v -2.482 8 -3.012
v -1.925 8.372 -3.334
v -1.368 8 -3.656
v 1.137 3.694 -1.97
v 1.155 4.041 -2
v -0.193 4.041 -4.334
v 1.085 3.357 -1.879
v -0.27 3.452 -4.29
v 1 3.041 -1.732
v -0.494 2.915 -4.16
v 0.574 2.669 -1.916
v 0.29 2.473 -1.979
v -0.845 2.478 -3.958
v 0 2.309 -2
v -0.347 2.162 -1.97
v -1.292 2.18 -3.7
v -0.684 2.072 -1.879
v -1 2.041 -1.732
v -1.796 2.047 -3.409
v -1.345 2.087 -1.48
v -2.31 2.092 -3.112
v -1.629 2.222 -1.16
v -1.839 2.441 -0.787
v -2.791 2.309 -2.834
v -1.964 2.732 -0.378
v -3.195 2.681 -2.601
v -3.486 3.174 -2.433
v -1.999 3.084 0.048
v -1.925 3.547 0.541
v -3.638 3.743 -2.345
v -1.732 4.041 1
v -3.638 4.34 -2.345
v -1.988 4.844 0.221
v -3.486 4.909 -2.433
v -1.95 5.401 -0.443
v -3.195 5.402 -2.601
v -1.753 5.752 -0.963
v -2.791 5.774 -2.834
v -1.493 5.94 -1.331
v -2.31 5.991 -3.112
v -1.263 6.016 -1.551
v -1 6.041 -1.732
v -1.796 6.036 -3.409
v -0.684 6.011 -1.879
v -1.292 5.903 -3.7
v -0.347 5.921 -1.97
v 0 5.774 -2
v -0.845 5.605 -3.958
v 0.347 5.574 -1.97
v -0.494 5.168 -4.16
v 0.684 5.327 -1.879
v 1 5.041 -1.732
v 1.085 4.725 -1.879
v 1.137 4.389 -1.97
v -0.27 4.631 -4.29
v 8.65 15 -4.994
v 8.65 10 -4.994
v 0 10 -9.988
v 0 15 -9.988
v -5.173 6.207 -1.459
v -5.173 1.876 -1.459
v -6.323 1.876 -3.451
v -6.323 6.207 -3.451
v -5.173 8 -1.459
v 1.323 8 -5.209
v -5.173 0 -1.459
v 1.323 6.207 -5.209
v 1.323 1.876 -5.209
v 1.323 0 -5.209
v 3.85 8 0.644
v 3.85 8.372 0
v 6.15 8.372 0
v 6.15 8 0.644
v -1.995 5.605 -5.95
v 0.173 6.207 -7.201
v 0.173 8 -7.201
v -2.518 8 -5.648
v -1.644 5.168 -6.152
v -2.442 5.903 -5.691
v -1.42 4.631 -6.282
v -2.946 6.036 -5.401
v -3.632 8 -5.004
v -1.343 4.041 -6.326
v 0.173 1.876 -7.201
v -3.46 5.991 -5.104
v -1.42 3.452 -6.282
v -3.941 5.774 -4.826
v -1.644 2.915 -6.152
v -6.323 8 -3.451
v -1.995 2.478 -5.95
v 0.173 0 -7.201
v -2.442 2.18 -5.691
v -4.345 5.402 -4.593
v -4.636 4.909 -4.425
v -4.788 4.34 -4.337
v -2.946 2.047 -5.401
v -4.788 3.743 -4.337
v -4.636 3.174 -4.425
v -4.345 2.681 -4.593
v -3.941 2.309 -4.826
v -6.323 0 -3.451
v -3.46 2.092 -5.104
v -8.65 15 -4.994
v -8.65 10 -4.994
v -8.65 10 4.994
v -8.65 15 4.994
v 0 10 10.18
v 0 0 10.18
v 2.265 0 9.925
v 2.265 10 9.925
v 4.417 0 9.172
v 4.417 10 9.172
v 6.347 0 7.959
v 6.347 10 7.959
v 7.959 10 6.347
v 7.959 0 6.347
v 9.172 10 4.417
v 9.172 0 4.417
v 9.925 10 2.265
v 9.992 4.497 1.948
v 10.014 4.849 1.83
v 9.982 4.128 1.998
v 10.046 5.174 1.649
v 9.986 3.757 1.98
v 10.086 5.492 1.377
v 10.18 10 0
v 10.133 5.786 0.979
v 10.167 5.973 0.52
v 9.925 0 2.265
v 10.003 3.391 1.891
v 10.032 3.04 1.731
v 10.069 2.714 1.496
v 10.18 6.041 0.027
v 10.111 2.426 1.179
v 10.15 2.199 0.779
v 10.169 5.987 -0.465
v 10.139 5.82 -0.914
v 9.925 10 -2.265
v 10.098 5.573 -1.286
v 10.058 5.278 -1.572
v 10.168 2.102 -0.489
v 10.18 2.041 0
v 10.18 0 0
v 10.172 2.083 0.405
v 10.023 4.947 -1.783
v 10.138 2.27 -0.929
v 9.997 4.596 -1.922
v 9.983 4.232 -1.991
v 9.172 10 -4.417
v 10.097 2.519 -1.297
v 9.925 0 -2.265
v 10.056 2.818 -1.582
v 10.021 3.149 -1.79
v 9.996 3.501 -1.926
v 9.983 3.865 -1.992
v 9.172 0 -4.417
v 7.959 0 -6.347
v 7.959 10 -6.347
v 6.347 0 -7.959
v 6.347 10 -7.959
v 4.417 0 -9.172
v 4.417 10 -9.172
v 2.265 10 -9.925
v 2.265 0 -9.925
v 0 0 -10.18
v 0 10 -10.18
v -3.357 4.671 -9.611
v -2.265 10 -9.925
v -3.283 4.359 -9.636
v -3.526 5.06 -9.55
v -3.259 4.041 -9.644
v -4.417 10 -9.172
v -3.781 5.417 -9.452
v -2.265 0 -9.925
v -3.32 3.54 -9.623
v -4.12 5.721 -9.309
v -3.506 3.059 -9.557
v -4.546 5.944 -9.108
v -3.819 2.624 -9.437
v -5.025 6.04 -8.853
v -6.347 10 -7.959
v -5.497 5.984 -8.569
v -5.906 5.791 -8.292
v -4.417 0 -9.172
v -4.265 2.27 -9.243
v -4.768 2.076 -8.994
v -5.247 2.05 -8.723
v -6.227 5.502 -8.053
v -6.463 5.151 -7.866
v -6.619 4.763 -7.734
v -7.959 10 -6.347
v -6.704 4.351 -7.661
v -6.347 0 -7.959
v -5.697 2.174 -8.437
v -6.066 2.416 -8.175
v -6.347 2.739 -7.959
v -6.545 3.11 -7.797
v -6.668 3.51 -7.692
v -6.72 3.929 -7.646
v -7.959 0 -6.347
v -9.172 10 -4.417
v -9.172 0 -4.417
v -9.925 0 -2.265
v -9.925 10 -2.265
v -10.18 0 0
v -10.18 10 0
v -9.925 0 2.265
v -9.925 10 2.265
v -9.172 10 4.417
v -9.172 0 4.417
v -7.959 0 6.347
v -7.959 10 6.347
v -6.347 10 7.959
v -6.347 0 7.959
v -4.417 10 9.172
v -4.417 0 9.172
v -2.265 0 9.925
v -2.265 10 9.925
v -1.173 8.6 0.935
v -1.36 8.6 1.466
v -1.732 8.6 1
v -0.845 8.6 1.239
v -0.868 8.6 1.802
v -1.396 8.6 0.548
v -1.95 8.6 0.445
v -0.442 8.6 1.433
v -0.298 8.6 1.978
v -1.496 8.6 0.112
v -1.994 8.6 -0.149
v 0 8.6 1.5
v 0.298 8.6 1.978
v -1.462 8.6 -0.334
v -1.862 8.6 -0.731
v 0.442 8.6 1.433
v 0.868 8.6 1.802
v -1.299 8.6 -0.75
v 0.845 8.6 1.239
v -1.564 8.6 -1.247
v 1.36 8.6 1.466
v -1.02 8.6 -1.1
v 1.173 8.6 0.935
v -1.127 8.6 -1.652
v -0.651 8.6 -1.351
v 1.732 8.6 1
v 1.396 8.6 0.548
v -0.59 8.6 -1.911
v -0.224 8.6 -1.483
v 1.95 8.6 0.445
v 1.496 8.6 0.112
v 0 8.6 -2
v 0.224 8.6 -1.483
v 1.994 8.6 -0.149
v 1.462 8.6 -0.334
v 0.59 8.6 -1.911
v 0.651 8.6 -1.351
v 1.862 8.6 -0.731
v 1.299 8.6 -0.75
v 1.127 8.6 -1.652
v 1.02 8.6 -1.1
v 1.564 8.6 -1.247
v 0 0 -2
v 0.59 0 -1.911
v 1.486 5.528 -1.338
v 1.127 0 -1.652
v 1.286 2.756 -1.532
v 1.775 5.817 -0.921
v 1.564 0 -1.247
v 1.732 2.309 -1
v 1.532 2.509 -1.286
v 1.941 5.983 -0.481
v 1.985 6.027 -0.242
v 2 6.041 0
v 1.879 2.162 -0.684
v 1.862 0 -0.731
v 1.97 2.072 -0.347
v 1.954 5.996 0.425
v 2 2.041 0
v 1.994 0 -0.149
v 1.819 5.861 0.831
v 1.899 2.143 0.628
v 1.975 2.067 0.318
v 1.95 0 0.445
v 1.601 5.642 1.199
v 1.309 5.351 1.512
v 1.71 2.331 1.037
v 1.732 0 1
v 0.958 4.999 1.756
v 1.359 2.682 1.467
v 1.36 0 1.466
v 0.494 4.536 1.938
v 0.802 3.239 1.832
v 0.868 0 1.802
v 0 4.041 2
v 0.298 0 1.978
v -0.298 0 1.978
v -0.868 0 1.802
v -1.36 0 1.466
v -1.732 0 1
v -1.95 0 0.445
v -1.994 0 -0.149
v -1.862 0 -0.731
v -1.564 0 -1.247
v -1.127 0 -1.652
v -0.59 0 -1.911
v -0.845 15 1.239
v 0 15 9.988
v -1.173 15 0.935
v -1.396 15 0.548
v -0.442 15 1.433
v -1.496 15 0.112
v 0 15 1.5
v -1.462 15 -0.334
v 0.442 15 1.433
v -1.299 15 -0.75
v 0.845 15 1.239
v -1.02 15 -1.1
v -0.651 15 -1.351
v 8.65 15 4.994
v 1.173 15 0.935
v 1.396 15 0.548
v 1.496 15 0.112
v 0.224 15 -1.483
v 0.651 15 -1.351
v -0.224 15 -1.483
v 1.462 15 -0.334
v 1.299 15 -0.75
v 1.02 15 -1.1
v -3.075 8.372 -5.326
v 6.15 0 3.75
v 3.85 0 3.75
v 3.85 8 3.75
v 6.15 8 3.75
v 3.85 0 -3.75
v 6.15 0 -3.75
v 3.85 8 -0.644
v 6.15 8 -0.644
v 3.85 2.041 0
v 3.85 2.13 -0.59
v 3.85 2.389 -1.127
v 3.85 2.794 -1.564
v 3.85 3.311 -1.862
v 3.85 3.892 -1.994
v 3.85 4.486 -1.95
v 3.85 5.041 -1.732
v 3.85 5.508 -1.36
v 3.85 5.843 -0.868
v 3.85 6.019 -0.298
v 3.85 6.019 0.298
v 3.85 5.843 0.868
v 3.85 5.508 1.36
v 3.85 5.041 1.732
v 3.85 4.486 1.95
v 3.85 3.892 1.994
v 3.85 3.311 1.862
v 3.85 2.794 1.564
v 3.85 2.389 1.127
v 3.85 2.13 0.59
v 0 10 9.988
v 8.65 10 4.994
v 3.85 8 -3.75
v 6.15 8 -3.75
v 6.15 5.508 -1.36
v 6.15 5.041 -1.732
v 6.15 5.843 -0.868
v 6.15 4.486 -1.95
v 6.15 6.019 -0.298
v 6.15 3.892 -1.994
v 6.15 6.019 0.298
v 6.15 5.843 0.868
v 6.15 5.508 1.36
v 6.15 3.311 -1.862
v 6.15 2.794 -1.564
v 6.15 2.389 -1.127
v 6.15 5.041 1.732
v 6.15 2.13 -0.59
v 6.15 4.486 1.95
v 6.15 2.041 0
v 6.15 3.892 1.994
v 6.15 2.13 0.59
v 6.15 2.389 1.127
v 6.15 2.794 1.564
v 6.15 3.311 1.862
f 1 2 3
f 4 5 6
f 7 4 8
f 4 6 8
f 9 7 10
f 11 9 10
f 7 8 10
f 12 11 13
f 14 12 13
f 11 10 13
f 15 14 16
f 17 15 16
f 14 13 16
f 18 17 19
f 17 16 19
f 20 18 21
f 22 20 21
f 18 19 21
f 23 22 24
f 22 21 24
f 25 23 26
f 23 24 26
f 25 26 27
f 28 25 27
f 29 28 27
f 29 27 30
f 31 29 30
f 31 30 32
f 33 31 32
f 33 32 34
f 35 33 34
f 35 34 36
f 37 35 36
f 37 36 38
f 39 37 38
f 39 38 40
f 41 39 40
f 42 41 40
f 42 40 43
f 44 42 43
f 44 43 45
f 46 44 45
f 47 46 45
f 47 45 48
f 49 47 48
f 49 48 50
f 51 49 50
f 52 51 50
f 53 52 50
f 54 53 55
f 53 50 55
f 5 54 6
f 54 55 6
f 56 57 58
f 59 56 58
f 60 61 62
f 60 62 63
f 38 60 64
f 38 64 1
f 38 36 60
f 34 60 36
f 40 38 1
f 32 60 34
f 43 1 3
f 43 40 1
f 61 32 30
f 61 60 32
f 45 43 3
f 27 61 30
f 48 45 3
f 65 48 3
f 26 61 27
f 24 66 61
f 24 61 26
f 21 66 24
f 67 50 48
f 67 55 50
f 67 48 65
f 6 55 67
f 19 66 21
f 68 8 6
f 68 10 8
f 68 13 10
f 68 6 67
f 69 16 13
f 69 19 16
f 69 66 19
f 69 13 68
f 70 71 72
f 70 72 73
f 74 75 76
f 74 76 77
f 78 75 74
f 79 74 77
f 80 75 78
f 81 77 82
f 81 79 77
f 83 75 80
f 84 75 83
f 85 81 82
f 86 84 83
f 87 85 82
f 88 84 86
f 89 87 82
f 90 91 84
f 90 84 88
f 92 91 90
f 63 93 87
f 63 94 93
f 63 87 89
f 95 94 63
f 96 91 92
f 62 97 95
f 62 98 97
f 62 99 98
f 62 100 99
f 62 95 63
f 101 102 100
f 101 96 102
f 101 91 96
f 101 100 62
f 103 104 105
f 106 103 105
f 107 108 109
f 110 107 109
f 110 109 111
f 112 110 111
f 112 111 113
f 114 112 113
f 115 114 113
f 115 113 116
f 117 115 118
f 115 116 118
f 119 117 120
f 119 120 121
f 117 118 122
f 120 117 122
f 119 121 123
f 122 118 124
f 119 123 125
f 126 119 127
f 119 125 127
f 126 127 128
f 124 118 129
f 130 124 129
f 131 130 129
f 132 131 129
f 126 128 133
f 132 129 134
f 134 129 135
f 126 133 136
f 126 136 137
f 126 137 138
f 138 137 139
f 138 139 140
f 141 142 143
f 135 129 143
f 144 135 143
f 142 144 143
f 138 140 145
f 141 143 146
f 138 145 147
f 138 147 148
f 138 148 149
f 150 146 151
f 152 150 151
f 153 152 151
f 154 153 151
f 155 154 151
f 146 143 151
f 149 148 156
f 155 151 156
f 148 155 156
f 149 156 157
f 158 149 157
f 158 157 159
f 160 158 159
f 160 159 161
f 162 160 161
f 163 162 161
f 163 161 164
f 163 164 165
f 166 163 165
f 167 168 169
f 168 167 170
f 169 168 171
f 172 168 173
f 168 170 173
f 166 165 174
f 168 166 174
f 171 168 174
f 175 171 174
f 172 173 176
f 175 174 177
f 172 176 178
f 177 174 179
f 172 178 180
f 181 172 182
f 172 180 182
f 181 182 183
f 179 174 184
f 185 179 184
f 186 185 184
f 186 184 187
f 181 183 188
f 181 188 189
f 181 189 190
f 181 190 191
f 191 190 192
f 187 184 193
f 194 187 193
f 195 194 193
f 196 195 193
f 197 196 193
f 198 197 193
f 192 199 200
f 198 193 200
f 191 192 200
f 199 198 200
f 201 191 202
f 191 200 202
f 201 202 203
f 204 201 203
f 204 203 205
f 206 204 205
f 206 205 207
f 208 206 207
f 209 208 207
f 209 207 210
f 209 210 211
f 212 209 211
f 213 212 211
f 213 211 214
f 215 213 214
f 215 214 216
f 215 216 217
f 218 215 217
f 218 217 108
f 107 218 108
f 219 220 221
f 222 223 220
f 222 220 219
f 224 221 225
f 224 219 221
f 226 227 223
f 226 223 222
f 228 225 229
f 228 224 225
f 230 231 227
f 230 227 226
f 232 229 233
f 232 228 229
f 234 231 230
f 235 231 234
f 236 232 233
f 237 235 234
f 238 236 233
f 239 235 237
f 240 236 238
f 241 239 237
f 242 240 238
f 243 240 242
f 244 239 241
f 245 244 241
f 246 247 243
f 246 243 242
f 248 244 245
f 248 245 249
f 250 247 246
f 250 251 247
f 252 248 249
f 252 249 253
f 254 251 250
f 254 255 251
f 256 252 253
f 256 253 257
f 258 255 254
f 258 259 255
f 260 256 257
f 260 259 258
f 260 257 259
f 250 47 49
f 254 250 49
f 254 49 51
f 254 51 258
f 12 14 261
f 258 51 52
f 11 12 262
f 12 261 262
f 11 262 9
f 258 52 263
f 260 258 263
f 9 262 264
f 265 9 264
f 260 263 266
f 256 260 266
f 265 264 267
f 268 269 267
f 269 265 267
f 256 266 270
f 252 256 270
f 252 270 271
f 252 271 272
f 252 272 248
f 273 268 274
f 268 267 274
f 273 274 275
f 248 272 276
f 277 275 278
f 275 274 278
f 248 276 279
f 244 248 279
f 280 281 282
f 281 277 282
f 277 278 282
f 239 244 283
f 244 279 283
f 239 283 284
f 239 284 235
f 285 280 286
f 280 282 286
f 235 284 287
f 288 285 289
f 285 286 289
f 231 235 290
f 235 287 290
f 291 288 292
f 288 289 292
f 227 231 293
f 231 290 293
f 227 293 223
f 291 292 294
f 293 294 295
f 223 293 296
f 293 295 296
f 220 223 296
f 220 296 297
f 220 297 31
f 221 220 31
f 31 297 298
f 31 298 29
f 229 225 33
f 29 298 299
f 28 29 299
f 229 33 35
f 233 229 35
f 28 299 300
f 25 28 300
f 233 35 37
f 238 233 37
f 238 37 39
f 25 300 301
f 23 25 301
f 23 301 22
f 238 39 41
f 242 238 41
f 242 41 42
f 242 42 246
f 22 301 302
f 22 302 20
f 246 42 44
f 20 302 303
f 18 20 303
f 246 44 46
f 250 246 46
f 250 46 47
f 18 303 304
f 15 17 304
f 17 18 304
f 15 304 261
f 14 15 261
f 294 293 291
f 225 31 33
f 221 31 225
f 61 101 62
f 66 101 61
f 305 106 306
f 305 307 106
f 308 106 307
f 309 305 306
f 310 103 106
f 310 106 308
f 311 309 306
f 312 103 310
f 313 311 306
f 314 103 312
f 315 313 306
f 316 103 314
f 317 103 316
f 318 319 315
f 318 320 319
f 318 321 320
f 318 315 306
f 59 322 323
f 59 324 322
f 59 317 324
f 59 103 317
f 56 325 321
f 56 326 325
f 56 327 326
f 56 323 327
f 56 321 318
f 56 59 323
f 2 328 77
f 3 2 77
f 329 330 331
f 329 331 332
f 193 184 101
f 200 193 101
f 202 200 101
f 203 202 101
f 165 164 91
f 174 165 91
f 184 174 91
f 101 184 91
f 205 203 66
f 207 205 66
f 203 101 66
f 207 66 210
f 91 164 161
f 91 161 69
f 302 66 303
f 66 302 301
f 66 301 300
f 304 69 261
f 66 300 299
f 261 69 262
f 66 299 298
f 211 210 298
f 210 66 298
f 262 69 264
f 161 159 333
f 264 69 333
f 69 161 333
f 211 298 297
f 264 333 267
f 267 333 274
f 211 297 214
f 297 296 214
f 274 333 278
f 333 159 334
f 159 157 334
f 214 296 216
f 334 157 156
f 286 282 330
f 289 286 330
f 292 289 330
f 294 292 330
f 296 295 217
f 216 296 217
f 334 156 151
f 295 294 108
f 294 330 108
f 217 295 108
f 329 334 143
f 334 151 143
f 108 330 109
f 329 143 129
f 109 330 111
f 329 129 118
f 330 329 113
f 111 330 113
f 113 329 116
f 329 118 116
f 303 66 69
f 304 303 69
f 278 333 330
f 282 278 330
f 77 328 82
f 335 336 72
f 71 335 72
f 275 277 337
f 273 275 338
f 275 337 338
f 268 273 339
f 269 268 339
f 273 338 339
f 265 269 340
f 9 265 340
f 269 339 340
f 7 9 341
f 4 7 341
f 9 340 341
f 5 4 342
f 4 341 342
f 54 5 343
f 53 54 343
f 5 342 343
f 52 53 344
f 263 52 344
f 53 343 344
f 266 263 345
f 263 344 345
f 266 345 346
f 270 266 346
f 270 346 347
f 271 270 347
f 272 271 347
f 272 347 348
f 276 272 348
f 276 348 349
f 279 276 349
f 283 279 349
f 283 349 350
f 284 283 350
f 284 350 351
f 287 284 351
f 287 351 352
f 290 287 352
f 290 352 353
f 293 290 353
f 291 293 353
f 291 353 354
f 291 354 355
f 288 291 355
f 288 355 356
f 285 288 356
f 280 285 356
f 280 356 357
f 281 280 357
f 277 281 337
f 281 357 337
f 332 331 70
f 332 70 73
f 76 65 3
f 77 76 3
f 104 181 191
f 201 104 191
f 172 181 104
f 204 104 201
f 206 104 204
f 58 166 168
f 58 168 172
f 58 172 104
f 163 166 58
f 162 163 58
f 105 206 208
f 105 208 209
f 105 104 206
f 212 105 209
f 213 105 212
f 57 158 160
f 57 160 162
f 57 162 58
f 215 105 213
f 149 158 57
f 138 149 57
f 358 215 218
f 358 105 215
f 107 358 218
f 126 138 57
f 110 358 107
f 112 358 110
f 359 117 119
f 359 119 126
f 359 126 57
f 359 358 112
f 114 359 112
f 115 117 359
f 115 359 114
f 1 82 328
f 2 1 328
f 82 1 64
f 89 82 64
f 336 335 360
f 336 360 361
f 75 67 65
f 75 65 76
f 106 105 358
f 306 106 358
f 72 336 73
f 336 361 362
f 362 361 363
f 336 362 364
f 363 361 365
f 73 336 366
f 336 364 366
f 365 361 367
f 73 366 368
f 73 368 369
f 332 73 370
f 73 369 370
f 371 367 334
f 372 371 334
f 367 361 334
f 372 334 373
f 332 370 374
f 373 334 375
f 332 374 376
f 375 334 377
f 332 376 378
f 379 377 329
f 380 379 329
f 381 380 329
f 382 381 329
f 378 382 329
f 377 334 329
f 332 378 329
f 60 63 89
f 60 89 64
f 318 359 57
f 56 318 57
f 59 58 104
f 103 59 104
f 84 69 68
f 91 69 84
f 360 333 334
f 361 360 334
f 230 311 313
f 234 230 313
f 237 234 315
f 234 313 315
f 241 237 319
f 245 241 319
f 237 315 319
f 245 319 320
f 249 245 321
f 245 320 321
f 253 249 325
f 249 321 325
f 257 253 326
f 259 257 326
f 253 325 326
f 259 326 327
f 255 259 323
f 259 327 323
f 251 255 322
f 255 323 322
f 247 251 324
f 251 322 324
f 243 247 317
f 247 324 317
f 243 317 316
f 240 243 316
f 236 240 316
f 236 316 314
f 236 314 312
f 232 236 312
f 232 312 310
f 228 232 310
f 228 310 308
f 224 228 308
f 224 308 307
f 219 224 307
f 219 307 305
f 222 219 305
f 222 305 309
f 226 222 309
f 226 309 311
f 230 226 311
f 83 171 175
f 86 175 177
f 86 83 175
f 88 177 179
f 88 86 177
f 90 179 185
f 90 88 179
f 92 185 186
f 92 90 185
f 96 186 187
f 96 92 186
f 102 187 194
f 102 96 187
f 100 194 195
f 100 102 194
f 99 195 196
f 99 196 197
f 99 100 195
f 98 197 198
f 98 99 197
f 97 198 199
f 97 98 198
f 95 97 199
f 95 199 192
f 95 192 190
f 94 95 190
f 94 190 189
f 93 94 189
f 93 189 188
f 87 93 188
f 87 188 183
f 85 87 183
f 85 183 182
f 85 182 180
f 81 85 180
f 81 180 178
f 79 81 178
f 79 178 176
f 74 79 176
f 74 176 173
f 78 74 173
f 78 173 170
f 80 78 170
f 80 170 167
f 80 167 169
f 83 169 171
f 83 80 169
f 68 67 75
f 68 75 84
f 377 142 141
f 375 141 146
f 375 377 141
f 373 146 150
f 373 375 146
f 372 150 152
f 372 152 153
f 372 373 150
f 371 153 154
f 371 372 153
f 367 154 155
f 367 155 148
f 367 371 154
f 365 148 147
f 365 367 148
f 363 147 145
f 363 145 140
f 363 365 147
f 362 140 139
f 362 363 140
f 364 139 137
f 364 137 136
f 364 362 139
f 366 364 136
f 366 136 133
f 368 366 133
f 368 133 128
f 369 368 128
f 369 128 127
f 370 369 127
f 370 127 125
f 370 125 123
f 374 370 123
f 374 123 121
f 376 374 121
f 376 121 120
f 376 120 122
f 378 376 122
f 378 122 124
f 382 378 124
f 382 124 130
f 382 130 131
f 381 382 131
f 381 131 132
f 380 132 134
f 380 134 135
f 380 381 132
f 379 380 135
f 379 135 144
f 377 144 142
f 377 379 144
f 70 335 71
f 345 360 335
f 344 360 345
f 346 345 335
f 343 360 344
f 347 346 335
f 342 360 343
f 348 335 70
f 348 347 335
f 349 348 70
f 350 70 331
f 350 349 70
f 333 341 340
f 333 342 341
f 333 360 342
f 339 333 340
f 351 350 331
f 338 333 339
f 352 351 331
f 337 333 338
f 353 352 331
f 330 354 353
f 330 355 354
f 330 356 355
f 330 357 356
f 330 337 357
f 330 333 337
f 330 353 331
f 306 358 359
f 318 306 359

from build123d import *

# Parameters (mm, degrees)
SKETCH_1_R                           = 10.18
EXTRUDE_355_DEPTH                    = 10
EXTRUDE_479_DEPTH                    = 5
SKETCH_3_R                           = 2
CUT_EXTRUDE_578_DEPTH                = 8.6
SKETCH_4_W                           = 2.3
SKETCH_4_H                           = 7.5
CUT_EXTRUDE_807_DEPTH                = 8
SKETCH_5_R                           = 2
CUT_EXTRUDE_1_DEPTH                  = 23.923204401
CUT_EXTRUDE_1_DIRECTION_2_REACH      = 24.923
CUT_EXTRUDE_1_DIRECTION_2_END_RADIUS = 2
SKETCH_6_R                           = 2
CUT_EXTRUDE_2_DEPTH                  = 24.540700338
CUT_EXTRUDE_2_DIRECTION_2_REACH      = 25.541
CUT_EXTRUDE_2_DIRECTION_2_END_RADIUS = 2
CUT_EXTRUDE_1_2_DEPTH                = 2.3
CUT_EXTRUDE_2_2_DEPTH                = 2.3
SKETCH_9_R                           = 1.5
CUT_EXTRUDE_7_DEPTH                  = 21.790978983


with BuildPart() as part:
    # Эскиз1 → Extrude 355 (new body)
    with BuildSketch(Plane(origin=(0, 0, 0), x_dir=(1, 0, 0), z_dir=(0, 1, 0))):
        with Locations(Location((0, 0, 0), (0, 0, 270))):
            Circle(SKETCH_1_R)
    extrude(amount=EXTRUDE_355_DEPTH)

    # Эскиз2 → Extrude 479 (add)
    with BuildSketch(Plane(origin=(0, 10, 0), x_dir=(1, 0, 0), z_dir=(0, 1, 0))):
        Polygon((0, 9.988159657), (-8.65, 4.994079828), (-8.65, -4.994079828), (0, -9.988159657), (8.65, -4.994079828), (8.65, 4.994079828), align=None)
    extrude(amount=EXTRUDE_479_DEPTH)

    # Эскиз3 → Cut-Extrude 578 (cut)
    with BuildSketch(Plane.XZ):
        with Locations(Location((0, 0, 0), (0, 0, 270))):
            Circle(SKETCH_3_R)
    extrude(amount=-CUT_EXTRUDE_578_DEPTH, mode=Mode.SUBTRACT)

    # Эскиз4 → Cut-Extrude 807 (cut)
    with BuildSketch(Plane.XZ):
        Polygon((-5.172595264, -1.459197805), (1.322595264, -5.209197805), (0.172595264, -7.201056233), (-6.322595264, -3.451056233), align=None)
        with Locations((5, 0)):
            Rectangle(SKETCH_4_W, SKETCH_4_H)
    extrude(amount=-CUT_EXTRUDE_807_DEPTH, mode=Mode.SUBTRACT)

    # Эскиз5 → Cut-Extrude 1 (cut)
    with BuildSketch(Plane(origin=(3.85, 0, 0), x_dir=(0, 0, -1), z_dir=(1, 0, 0))):
        with Locations(Location((0, 4.041451884, 0), (0, 0, 270))):
            Circle(SKETCH_5_R)
    extrude(amount=CUT_EXTRUDE_1_DEPTH, mode=Mode.SUBTRACT)

    # Cut-Extrude 1 direction 2: up to this cylinder (the profile starts outside it)
    cut_extrude_1_direction_2_end = Plane(origin=(0, 4.041452, 0), z_dir=(0, -1, 0)) * Cylinder(CUT_EXTRUDE_1_DIRECTION_2_END_RADIUS, 54.846, mode=Mode.PRIVATE)
    # Эскиз5 → Cut-Extrude 1 direction 2 (cut, up to the surface)
    with BuildSketch(Plane(origin=(3.85, 0, 0), x_dir=(0, 0, -1), z_dir=(1, 0, 0)), mode=Mode.PRIVATE) as cut_extrude_1_direction_2_sk1:
        with Locations(Location((0, 4.041451884, 0), (0, 0, 270))):
            Circle(SKETCH_5_R)
    cut_extrude_1_direction_2_tool1 = extrude(cut_extrude_1_direction_2_sk1.sketch, amount=-CUT_EXTRUDE_1_DIRECTION_2_REACH, mode=Mode.PRIVATE) - cut_extrude_1_direction_2_end
    add(cut_extrude_1_direction_2_tool1.solids().sort_by_distance((3.85, 4.041452, 0))[0], mode=Mode.SUBTRACT)

    # Эскиз6 → Cut-Extrude 2 (cut)
    with BuildSketch(Plane(origin=(-1.925, 0, -3.334197805), x_dir=(-0.8660254037844363, 0, 0.5000000000000042), z_dir=(-0.5000000000000042, 0, -0.8660254037844363))):
        with Locations(Location((0, 4.041451884, 0), (0, 0, 180))):
            Circle(SKETCH_6_R)
    extrude(amount=CUT_EXTRUDE_2_DEPTH, mode=Mode.SUBTRACT)

    # Cut-Extrude 2 direction 2: up to this cylinder (the profile starts outside it)
    cut_extrude_2_direction_2_end = Plane(origin=(0, 4.041452, 0), z_dir=(0, -1, 0)) * Cylinder(CUT_EXTRUDE_2_DIRECTION_2_END_RADIUS, 56.082, mode=Mode.PRIVATE)
    # Эскиз6 → Cut-Extrude 2 direction 2 (cut, up to the surface)
    with BuildSketch(Plane(origin=(-1.925, 0, -3.334197805), x_dir=(-0.8660254037844363, 0, 0.5000000000000042), z_dir=(-0.5000000000000042, 0, -0.8660254037844363)), mode=Mode.PRIVATE) as cut_extrude_2_direction_2_sk1:
        with Locations(Location((0, 4.041451884, 0), (0, 0, 180))):
            Circle(SKETCH_6_R)
    cut_extrude_2_direction_2_tool1 = extrude(cut_extrude_2_direction_2_sk1.sketch, amount=-CUT_EXTRUDE_2_DIRECTION_2_REACH, mode=Mode.PRIVATE) - cut_extrude_2_direction_2_end
    add(cut_extrude_2_direction_2_tool1.solids().sort_by_distance((-1.925, 4.041452, -3.334198))[0], mode=Mode.SUBTRACT)

    # Эскиз7 → Cut-Extrude 1 2 (cut)
    with BuildSketch(Plane(origin=(3.85, 0, 0), x_dir=(0, 0, -1), z_dir=(1, 0, 0))):
        Polygon((-3.75, 1.876388375), (0, -0.288675135), (3.75, 1.876388375), (3.75, 6.206515394), (0, 8.371578903), (-3.75, 6.206515394), align=None)
    extrude(amount=CUT_EXTRUDE_1_2_DEPTH, mode=Mode.SUBTRACT)

    # Эскиз8 → Cut-Extrude 2 2 (cut)
    with BuildSketch(Plane(origin=(-1.925, 0, -3.334197805), x_dir=(-0.8660254037844363, 0, 0.5000000000000042), z_dir=(-0.5000000000000042, 0, -0.8660254037844363))):
        Polygon((0, 8.371578903), (-3.75, 6.206515394), (-3.75, 1.876388375), (0, -0.288675135), (3.75, 1.876388375), (3.75, 6.206515394), align=None)
    extrude(amount=CUT_EXTRUDE_2_2_DEPTH, mode=Mode.SUBTRACT)

    # Эскиз9 → Вырез-Вытянуть7 (cut, through all)
    with BuildSketch(Plane(origin=(0, 15, 0), x_dir=(1, 0, 0), z_dir=(0, 1, 0))):
        with Locations(Location((0, 0, 0), (0, 0, 270))):
            Circle(SKETCH_9_R)
    extrude(amount=-CUT_EXTRUDE_7_DEPTH, mode=Mode.SUBTRACT)


solid = part.part
